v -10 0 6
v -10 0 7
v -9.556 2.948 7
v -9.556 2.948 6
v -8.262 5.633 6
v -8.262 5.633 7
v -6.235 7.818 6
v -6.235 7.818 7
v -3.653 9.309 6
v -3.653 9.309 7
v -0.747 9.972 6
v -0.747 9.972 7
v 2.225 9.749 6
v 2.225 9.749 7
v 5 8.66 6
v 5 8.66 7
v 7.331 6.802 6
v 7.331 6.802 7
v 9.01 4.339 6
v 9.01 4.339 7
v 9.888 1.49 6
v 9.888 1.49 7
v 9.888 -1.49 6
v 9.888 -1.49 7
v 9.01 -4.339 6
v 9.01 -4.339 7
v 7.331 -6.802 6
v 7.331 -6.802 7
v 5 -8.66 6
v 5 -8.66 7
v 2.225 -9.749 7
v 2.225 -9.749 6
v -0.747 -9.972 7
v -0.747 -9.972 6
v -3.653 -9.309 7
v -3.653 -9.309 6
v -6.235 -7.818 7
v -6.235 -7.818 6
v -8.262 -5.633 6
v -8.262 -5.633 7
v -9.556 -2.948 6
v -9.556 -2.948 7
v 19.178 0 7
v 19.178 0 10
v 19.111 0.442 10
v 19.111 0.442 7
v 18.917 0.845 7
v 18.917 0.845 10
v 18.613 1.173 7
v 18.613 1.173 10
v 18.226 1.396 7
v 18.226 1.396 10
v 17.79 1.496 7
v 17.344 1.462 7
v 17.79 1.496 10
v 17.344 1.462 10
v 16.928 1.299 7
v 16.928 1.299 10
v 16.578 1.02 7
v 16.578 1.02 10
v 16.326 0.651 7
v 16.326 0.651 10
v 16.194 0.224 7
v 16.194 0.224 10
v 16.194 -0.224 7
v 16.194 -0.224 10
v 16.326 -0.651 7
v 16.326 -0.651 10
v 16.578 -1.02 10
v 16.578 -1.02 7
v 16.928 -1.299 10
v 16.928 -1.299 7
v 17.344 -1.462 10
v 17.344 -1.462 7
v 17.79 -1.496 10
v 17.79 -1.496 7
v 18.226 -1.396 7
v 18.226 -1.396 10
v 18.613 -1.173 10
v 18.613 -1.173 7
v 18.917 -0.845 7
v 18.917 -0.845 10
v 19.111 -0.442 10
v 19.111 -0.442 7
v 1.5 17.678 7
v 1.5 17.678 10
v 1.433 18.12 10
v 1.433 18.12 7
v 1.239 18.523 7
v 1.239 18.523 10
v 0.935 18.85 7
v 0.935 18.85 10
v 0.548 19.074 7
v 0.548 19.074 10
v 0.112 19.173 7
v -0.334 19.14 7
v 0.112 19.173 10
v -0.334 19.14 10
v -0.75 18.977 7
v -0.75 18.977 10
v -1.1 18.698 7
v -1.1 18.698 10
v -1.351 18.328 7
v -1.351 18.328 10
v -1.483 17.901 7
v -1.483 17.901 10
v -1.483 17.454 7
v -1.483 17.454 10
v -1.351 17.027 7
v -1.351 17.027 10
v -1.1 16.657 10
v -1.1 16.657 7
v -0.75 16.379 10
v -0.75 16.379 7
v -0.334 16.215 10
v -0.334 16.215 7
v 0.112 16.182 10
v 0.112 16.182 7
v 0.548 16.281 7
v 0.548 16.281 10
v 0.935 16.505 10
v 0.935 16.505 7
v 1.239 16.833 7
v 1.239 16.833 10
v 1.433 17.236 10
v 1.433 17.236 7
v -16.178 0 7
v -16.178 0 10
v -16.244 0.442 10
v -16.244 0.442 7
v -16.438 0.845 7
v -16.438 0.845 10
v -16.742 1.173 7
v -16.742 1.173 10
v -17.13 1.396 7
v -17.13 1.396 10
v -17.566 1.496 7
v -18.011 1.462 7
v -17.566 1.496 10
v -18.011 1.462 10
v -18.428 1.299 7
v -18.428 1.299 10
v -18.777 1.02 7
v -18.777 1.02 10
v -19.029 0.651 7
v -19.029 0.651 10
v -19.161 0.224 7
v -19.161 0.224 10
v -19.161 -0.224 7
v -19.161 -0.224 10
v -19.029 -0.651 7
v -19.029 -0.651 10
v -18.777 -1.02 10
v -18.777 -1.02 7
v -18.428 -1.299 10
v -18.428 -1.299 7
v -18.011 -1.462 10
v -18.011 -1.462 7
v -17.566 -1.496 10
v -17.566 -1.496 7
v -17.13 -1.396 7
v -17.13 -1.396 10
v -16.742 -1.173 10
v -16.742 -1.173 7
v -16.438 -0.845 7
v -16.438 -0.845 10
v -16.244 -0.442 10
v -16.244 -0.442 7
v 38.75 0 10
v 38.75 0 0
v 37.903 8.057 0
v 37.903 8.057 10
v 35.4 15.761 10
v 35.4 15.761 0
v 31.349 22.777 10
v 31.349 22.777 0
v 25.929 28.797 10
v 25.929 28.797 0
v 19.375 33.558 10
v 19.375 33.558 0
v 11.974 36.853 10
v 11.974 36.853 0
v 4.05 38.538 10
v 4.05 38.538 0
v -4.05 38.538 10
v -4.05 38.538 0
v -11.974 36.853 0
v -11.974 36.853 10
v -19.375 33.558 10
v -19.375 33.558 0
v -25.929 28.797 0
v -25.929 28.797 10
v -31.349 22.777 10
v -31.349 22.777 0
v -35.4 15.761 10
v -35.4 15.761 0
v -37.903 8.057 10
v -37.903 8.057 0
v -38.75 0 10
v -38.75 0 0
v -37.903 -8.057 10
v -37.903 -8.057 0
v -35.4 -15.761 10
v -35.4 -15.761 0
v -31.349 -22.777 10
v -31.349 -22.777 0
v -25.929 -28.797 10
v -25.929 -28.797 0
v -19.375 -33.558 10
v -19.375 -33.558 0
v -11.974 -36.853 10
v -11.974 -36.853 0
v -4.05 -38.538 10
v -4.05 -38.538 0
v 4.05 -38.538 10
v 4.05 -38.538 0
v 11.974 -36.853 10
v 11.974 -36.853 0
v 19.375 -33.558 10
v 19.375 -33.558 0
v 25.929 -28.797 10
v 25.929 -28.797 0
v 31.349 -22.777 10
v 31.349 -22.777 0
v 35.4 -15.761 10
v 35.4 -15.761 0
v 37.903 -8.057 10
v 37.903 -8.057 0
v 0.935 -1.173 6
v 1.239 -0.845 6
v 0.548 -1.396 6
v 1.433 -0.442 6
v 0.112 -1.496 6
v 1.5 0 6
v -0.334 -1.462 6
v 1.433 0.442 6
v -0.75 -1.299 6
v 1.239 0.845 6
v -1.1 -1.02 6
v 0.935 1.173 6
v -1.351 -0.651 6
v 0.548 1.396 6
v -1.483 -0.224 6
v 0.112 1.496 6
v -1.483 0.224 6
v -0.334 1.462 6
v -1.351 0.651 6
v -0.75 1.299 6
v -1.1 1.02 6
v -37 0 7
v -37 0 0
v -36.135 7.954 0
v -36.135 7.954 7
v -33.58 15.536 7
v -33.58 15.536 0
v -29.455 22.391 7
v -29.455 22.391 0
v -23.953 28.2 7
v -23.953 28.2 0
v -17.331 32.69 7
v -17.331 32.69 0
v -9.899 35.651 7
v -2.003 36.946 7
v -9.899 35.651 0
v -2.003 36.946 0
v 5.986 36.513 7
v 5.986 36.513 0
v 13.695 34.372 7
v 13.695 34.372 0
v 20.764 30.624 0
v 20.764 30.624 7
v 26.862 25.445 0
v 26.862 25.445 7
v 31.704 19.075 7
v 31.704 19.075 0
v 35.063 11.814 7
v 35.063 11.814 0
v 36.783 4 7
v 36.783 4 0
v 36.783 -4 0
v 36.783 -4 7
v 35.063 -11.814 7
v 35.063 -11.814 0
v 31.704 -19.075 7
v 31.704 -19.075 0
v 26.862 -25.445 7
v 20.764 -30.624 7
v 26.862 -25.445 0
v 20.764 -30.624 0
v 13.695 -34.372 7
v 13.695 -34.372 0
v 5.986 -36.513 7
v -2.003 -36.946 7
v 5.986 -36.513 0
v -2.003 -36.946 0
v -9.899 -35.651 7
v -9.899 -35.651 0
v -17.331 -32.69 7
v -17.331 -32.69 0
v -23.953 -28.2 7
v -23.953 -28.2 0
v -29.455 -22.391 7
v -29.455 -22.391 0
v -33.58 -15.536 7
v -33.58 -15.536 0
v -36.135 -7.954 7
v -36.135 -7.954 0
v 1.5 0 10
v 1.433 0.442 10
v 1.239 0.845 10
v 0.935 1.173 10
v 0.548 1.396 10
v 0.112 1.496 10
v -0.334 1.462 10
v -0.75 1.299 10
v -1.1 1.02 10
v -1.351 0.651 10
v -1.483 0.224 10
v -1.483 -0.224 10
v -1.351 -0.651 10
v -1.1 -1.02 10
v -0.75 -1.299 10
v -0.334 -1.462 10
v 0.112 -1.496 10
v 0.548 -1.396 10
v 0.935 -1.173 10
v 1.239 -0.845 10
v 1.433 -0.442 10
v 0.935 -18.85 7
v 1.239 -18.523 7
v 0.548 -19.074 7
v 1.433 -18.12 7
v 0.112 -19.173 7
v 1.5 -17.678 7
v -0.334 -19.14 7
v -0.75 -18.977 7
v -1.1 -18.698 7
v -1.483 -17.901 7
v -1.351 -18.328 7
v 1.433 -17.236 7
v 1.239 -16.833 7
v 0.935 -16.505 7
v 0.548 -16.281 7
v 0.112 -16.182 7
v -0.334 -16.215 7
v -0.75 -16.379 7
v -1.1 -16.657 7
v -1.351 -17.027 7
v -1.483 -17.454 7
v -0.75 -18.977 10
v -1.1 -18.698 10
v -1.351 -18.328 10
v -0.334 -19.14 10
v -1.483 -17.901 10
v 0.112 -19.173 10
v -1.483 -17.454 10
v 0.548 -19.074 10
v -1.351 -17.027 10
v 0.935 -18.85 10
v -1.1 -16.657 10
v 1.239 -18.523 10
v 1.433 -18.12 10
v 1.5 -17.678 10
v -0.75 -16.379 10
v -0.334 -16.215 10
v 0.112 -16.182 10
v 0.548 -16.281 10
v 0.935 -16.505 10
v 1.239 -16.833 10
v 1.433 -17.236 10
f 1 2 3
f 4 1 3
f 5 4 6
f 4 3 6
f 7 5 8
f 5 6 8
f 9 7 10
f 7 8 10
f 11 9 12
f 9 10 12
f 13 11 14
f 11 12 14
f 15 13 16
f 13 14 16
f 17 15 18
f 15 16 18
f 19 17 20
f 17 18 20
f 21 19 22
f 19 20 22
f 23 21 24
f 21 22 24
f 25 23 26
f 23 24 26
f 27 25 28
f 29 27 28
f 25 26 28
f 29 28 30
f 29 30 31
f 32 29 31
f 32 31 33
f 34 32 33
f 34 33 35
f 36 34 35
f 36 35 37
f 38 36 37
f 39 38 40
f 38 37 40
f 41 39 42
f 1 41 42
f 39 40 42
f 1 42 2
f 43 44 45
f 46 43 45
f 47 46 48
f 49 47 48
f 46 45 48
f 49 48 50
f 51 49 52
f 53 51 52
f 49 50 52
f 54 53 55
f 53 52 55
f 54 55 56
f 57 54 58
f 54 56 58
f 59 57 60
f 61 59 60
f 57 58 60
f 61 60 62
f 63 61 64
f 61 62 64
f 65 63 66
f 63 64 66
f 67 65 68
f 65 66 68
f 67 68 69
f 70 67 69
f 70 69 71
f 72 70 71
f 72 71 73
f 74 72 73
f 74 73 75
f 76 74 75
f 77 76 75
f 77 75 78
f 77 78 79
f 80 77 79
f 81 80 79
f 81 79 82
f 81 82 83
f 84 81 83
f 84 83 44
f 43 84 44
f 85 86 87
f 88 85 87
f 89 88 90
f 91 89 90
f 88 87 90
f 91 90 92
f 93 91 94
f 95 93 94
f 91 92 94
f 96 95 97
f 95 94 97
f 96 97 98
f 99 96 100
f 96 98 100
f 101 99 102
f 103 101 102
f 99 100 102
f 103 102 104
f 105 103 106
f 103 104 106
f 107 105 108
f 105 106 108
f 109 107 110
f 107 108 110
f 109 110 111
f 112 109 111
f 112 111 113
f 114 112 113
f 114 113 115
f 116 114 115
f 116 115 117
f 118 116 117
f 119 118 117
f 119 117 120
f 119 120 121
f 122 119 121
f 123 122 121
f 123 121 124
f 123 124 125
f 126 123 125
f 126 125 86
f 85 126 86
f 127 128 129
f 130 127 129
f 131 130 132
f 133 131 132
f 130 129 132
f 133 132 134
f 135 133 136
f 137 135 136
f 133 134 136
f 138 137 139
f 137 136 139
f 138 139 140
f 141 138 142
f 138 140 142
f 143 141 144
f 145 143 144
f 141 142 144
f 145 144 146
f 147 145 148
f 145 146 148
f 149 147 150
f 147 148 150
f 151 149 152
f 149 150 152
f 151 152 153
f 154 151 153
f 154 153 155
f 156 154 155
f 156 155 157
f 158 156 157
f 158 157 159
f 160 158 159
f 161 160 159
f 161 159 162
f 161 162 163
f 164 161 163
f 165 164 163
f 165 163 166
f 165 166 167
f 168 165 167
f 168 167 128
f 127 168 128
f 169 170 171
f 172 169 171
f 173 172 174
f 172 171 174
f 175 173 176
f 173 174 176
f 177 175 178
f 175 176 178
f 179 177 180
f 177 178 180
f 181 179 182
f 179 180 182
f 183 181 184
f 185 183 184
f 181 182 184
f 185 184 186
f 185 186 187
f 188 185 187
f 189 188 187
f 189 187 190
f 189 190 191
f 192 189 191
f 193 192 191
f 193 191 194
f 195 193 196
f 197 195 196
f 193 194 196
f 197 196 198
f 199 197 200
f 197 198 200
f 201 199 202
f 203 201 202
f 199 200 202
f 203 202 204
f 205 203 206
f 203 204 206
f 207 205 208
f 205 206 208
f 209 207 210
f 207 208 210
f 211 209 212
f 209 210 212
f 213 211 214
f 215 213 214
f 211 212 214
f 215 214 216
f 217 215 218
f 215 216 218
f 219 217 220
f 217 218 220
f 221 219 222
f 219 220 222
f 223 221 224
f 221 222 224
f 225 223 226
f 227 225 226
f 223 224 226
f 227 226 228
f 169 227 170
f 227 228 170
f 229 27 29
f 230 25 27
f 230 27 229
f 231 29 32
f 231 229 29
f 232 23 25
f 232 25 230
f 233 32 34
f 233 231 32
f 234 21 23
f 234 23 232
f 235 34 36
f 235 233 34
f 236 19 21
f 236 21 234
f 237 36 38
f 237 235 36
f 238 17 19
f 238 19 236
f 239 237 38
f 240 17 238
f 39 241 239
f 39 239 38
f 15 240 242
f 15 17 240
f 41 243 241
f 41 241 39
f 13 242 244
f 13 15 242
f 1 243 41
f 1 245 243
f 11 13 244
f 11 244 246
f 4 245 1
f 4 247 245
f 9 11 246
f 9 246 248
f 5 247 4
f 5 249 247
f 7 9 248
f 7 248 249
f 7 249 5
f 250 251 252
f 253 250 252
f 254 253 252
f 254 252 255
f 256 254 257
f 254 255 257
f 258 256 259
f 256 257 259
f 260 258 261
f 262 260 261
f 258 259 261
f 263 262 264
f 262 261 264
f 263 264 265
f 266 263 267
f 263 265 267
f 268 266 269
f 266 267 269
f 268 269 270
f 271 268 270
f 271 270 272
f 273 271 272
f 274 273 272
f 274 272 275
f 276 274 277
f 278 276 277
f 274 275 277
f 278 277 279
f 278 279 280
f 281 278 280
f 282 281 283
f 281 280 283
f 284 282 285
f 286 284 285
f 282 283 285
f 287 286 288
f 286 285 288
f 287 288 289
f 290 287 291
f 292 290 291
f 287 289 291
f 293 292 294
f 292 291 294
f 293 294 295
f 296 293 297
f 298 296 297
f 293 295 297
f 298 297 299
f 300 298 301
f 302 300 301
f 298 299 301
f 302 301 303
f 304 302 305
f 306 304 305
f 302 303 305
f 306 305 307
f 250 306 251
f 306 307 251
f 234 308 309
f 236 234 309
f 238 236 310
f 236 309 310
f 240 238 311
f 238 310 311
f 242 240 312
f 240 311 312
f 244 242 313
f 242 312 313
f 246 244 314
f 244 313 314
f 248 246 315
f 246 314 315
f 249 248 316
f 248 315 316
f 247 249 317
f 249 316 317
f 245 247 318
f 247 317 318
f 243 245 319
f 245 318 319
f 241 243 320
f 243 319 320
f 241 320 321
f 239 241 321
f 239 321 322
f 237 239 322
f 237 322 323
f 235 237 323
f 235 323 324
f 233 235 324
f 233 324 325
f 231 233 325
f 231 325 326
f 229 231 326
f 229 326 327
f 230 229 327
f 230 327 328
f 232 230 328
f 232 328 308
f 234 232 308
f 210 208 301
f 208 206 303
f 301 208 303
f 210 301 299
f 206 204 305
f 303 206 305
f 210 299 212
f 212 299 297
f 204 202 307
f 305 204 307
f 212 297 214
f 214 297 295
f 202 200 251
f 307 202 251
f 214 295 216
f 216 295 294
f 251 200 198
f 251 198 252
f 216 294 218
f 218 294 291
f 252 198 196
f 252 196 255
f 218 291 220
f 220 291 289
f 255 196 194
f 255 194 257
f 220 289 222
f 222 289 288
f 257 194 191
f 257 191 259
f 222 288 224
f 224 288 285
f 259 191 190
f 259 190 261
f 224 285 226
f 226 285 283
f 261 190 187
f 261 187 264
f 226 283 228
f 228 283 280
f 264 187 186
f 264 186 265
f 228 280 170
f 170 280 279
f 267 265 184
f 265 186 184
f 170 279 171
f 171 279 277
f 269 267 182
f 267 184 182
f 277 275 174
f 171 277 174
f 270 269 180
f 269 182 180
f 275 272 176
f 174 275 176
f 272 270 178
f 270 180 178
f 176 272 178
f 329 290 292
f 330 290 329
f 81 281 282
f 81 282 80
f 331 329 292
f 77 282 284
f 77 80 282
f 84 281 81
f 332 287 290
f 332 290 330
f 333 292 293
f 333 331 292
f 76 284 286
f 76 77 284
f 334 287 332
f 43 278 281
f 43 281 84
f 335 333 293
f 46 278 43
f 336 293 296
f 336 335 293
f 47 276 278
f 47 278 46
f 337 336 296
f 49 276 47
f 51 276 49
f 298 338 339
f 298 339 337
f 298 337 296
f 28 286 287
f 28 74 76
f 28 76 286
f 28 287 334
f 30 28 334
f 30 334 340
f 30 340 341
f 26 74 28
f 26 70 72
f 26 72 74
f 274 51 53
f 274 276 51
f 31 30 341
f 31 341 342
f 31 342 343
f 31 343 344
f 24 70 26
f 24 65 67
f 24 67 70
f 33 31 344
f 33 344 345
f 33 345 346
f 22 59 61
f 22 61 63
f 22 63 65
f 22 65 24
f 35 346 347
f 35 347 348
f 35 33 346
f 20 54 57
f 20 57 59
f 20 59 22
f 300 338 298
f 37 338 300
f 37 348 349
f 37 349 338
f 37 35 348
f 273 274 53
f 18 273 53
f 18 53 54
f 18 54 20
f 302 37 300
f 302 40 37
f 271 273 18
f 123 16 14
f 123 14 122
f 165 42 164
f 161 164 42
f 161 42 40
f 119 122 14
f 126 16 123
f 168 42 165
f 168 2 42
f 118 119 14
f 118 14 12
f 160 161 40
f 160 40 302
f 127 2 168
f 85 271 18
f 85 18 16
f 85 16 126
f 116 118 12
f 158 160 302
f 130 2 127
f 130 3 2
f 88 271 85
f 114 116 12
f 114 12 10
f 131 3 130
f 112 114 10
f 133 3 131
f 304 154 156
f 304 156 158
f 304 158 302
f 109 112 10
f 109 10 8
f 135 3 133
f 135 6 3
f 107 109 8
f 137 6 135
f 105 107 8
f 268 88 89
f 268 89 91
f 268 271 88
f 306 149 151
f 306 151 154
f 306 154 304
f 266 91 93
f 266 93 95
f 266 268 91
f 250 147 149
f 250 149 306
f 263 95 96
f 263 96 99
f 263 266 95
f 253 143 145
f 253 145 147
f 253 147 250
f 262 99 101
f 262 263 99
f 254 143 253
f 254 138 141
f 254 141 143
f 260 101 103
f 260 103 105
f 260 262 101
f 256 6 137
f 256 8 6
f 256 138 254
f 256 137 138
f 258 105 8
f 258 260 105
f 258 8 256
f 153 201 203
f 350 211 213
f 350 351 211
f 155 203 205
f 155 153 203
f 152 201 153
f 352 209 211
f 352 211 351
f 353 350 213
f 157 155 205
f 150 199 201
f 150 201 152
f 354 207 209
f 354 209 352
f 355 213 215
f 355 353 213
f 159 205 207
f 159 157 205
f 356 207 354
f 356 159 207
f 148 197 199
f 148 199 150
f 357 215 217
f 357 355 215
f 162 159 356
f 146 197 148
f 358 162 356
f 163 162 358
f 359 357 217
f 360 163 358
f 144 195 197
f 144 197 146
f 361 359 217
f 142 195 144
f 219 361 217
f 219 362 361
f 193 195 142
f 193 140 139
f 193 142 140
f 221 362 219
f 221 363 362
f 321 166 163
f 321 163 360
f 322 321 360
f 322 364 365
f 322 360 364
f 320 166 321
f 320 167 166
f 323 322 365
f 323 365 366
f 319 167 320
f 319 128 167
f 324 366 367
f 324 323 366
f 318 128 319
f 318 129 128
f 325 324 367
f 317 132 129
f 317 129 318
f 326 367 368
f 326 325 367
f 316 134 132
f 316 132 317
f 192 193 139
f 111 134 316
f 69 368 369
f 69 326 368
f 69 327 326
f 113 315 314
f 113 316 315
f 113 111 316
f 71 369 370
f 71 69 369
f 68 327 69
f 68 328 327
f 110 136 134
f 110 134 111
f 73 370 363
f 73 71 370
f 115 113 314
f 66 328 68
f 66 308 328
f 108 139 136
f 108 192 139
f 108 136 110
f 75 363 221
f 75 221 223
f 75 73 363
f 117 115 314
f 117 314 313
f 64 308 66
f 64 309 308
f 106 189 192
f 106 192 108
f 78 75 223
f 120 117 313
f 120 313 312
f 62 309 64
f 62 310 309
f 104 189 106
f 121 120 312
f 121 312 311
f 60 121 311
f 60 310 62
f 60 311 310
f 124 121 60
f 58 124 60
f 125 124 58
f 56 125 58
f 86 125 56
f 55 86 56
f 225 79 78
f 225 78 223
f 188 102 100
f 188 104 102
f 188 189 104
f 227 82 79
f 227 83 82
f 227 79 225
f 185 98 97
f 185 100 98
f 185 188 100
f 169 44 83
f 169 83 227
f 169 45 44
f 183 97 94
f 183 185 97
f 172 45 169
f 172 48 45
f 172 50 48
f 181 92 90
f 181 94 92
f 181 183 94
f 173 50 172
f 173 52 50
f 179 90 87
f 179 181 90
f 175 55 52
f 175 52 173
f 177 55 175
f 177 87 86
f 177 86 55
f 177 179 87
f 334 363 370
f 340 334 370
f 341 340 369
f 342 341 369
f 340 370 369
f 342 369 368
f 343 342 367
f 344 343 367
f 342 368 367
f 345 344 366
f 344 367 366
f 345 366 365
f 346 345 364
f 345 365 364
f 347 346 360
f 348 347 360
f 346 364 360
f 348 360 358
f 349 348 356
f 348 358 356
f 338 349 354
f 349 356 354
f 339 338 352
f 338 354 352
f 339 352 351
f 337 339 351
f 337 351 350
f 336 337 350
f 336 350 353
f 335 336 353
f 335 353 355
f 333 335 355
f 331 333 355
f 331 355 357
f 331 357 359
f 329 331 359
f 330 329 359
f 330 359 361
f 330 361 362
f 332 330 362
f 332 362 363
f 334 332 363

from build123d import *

# Parameters (mm, degrees)
SKETCH_1_R          = 38.75
EXTRUDE_1_DEPTH     = 10
SKETCH_2_R          = 37
CUT_EXTRUDE_1_DEPTH = 7
SKETCH_3_R          = 10
EXTRUDE_2_DEPTH     = 1
SKETCH_4_R          = 1.5
CUT_EXTRUDE_2_DEPTH = 56.705699888


with BuildPart() as part:
    # 草图1 → 凸台-拉伸1 (new body)
    with BuildSketch(Plane.XY):
        Circle(SKETCH_1_R)
    extrude(amount=EXTRUDE_1_DEPTH)

    # 草图2 → 切除-拉伸1 (cut)
    with BuildSketch(Plane(origin=(0, 0, 0), x_dir=(-1, 0, 0), z_dir=(0, 0, -1))):
        Circle(SKETCH_2_R)
    extrude(amount=-CUT_EXTRUDE_1_DEPTH, mode=Mode.SUBTRACT)

    # 草图3 → 凸台-拉伸2 (add)
    with BuildSketch(Plane(origin=(0, 0, 7), x_dir=(-1, 0, 0), z_dir=(0, 0, -1))):
        Circle(SKETCH_3_R)
    extrude(amount=EXTRUDE_2_DEPTH)

    # 草图4 → 切除-拉伸2 (cut, through all)
    with BuildSketch(Plane.XY.offset(10)):
        with Locations((0, 17.67766953)):
            Circle(SKETCH_4_R)
        with Locations((17.67766953, 0)):
            Circle(SKETCH_4_R)
        with Locations((0, -17.67766953)):
            Circle(SKETCH_4_R)
        with Locations((-17.67766953, 0)):
            Circle(SKETCH_4_R)
        Circle(SKETCH_4_R)
    extrude(amount=-CUT_EXTRUDE_2_DEPTH, mode=Mode.SUBTRACT)


solid = part.part
